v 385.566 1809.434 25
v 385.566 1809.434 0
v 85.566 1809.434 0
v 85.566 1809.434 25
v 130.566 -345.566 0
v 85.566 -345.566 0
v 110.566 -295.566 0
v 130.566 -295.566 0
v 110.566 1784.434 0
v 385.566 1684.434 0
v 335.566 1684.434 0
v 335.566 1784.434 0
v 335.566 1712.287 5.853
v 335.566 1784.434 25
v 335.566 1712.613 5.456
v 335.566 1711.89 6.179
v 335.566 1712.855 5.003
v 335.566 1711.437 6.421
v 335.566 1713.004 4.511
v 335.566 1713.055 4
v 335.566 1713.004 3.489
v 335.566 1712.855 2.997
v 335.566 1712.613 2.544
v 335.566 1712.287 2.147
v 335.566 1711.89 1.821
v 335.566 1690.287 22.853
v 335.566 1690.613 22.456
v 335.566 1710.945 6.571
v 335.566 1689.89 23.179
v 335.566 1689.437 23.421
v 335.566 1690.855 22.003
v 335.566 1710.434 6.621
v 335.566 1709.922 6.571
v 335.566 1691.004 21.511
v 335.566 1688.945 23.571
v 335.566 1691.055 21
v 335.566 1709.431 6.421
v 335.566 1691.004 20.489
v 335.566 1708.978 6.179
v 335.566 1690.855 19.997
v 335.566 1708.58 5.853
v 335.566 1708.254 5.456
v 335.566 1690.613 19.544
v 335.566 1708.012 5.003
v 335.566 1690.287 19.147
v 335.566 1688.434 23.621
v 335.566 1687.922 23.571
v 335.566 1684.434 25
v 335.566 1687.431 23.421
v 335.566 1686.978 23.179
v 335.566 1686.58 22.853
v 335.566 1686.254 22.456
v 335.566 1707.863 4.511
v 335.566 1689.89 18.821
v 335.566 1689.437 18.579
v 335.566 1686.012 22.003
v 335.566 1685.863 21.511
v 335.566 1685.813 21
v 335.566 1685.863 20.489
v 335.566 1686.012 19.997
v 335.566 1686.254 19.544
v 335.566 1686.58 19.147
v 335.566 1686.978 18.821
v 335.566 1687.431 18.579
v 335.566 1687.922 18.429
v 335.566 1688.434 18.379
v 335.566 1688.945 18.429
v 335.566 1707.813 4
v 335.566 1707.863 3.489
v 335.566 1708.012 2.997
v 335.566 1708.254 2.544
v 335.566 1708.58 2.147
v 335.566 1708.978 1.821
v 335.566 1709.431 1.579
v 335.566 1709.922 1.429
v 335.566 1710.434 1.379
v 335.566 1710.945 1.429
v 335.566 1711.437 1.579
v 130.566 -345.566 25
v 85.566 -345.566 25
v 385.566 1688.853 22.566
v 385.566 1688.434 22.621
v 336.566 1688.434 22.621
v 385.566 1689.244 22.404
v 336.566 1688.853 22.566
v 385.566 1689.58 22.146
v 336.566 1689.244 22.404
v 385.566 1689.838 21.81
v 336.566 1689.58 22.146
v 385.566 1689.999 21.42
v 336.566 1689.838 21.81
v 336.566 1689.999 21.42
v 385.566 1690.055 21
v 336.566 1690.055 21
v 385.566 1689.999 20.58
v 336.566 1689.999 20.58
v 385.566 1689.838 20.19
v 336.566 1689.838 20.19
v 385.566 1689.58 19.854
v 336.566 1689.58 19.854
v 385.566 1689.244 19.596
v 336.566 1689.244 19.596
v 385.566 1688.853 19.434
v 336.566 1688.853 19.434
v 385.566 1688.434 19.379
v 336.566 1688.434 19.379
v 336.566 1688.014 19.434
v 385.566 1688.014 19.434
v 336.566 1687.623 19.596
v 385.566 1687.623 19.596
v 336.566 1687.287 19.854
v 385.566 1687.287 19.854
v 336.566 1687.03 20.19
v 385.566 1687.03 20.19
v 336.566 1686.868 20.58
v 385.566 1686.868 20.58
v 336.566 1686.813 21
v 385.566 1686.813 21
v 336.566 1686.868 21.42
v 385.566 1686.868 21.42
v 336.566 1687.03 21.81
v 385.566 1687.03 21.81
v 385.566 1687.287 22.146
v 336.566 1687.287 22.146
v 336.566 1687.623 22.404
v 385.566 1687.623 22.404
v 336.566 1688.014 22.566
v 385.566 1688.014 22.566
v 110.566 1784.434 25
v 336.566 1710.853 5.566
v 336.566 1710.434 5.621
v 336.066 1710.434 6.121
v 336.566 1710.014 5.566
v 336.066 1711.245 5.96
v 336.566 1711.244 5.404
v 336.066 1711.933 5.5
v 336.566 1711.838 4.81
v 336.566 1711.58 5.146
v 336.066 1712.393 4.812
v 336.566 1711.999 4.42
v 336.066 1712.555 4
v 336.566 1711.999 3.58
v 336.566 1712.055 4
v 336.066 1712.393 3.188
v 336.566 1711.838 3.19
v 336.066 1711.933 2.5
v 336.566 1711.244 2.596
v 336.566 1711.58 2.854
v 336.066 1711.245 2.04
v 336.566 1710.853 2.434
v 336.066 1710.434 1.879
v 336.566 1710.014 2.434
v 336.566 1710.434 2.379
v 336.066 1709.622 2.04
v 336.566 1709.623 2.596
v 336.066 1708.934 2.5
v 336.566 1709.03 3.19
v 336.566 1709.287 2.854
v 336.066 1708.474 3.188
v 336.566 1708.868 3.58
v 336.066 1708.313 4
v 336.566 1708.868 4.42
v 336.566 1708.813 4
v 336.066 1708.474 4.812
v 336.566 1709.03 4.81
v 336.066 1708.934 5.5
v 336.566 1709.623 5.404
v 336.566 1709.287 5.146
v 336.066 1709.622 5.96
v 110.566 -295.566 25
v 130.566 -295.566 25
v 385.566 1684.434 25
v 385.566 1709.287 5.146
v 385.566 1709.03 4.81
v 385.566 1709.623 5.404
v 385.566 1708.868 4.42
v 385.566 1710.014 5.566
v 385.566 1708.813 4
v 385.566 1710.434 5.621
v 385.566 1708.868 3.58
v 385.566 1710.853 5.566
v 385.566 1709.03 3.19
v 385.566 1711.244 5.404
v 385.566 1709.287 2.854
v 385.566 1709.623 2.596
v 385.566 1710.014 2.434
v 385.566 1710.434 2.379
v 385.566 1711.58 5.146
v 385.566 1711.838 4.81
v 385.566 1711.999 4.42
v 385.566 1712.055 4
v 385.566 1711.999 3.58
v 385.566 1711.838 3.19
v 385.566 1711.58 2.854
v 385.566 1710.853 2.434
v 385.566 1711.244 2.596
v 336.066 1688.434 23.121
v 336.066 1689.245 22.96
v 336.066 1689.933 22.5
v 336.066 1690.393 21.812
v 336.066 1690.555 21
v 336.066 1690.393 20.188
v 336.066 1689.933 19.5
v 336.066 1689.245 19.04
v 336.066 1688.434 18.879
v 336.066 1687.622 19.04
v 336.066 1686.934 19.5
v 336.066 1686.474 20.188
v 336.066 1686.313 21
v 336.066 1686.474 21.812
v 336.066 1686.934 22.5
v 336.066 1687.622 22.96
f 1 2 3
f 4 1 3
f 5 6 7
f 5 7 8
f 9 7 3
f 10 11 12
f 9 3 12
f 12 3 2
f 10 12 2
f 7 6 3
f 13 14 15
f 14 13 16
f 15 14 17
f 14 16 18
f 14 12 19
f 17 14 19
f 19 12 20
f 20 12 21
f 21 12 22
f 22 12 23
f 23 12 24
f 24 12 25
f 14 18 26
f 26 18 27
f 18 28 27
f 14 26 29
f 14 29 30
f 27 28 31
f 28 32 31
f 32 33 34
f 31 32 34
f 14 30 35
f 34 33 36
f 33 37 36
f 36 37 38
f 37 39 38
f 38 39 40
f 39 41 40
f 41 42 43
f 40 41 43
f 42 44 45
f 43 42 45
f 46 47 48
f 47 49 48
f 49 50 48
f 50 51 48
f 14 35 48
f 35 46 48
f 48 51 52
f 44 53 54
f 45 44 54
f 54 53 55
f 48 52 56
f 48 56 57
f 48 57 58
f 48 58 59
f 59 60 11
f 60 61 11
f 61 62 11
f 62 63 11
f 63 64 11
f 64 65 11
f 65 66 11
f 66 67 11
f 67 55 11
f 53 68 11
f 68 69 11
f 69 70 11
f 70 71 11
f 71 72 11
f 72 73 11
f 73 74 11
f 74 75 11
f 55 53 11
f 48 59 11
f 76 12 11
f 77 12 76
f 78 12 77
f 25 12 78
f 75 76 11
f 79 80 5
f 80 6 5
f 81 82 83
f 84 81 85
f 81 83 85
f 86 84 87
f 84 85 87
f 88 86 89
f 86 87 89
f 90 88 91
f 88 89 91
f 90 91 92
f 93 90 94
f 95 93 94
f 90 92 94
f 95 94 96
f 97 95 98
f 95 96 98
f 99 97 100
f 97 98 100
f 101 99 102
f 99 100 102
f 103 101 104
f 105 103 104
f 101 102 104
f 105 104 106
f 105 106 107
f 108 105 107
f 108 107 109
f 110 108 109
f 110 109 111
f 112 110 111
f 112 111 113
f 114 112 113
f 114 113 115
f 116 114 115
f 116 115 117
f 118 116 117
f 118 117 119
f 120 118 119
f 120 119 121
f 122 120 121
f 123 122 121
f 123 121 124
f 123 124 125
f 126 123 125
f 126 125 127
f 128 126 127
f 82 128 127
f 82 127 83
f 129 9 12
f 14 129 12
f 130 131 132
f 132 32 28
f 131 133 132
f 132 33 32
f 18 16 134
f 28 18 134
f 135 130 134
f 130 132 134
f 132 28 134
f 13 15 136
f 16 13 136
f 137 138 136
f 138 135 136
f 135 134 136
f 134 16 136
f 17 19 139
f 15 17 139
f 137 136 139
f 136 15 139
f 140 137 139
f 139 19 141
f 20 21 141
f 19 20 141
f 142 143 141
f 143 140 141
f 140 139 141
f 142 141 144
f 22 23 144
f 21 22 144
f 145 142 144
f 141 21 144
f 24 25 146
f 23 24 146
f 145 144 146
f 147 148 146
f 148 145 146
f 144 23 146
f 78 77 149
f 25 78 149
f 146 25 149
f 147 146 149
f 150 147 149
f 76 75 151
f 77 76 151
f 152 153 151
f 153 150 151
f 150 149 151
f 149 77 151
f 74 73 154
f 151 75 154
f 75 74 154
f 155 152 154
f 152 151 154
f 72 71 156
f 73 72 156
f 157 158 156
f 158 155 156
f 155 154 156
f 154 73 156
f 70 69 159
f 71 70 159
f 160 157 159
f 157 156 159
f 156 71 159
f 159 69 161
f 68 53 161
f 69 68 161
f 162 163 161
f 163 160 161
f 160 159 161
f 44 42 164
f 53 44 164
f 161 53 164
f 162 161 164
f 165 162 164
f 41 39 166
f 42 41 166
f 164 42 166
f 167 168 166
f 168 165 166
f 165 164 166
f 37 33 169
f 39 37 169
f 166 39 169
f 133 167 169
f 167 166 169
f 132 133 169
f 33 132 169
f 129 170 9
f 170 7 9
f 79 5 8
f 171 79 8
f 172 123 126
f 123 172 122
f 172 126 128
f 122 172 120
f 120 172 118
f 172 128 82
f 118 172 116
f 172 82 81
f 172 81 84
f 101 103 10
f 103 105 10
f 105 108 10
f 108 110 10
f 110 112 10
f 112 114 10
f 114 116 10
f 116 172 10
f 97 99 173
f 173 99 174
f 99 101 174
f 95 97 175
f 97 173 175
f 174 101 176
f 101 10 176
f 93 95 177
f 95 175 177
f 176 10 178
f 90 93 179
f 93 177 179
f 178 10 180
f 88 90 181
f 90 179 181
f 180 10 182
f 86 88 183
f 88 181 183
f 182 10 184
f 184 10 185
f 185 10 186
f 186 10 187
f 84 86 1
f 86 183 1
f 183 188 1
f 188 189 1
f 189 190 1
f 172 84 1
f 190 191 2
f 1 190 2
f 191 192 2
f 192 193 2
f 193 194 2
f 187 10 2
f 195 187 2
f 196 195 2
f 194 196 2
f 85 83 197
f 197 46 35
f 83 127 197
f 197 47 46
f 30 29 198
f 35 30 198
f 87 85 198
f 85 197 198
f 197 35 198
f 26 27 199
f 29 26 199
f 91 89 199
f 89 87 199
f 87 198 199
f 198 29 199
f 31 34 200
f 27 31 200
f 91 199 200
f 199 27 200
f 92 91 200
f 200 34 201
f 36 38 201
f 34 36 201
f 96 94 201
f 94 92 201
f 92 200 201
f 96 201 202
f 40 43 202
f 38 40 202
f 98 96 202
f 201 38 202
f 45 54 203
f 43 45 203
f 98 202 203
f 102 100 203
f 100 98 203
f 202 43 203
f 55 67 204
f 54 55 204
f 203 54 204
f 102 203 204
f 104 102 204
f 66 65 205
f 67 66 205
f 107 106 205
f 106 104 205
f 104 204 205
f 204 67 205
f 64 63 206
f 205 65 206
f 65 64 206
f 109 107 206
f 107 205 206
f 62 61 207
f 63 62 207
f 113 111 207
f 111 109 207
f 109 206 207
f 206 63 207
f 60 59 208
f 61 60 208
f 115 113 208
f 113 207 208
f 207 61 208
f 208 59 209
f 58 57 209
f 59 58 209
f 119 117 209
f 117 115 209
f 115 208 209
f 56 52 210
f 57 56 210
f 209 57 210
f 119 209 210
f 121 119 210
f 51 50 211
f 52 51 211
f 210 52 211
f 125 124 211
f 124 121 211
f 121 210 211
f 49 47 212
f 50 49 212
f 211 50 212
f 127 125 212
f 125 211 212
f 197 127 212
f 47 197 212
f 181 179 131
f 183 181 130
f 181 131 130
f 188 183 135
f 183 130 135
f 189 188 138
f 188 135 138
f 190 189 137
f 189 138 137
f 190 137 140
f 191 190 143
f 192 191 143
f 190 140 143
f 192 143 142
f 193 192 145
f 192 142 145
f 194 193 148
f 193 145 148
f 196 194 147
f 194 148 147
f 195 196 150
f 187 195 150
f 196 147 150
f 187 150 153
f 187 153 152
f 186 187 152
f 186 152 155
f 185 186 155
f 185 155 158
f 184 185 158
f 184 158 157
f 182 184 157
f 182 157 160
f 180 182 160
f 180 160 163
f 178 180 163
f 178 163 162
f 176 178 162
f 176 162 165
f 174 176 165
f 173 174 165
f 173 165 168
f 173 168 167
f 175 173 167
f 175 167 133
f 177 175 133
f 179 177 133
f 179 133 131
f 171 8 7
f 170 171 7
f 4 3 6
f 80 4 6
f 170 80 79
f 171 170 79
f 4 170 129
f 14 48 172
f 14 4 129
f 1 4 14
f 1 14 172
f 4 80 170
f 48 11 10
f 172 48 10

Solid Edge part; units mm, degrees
sketch "Sketch1" plane through (0, 0, 0) normal (0, 0, -1) x (-1, 0, 0)
  line L0 (-110.5657, -295.5663) -> (-110.5657, 1784.4337)
  line L1 (-110.5657, 1784.4337) -> (-335.5657, 1784.4337)
  line L2 (-335.5657, 1784.4337) -> (-335.5657, 1684.4337)
  line L3 (-335.5657, 1684.4337) -> (-385.5657, 1684.4337)
  line L4 (-385.5657, 1684.4337) -> (-385.5657, 1809.4337)
  line L5 (-385.5657, 1809.4337) -> (-85.5657, 1809.4337)
  line L6 (-85.5657, 1809.4337) -> (-85.5657, -345.5663)
  line L7 (-85.5657, -345.5663) -> (-130.5657, -345.5663)
  line L8 (-130.5657, -345.5663) -> (-130.5657, -295.5663)
  line L9 (-130.5657, -295.5663) -> (-110.5657, -295.5663)
extrude "Protrusion1" add sketch "Sketch1" against normal blind 25
hole "Hole_1" at (335.5657, 1688.4337, 21) direction (1, 0, 0) diameter 3.242 end up to next
hole "Hole1" at (335.5657, 1710.4337, 4) direction (1, 0, 0) diameter 3.242 end up to next
chamfer "Chamfer_1" distance 1 angle 45 2 edges at (335.5657, 1688.4337, 22.621) (335.5657, 1710.4337, 5.621)
